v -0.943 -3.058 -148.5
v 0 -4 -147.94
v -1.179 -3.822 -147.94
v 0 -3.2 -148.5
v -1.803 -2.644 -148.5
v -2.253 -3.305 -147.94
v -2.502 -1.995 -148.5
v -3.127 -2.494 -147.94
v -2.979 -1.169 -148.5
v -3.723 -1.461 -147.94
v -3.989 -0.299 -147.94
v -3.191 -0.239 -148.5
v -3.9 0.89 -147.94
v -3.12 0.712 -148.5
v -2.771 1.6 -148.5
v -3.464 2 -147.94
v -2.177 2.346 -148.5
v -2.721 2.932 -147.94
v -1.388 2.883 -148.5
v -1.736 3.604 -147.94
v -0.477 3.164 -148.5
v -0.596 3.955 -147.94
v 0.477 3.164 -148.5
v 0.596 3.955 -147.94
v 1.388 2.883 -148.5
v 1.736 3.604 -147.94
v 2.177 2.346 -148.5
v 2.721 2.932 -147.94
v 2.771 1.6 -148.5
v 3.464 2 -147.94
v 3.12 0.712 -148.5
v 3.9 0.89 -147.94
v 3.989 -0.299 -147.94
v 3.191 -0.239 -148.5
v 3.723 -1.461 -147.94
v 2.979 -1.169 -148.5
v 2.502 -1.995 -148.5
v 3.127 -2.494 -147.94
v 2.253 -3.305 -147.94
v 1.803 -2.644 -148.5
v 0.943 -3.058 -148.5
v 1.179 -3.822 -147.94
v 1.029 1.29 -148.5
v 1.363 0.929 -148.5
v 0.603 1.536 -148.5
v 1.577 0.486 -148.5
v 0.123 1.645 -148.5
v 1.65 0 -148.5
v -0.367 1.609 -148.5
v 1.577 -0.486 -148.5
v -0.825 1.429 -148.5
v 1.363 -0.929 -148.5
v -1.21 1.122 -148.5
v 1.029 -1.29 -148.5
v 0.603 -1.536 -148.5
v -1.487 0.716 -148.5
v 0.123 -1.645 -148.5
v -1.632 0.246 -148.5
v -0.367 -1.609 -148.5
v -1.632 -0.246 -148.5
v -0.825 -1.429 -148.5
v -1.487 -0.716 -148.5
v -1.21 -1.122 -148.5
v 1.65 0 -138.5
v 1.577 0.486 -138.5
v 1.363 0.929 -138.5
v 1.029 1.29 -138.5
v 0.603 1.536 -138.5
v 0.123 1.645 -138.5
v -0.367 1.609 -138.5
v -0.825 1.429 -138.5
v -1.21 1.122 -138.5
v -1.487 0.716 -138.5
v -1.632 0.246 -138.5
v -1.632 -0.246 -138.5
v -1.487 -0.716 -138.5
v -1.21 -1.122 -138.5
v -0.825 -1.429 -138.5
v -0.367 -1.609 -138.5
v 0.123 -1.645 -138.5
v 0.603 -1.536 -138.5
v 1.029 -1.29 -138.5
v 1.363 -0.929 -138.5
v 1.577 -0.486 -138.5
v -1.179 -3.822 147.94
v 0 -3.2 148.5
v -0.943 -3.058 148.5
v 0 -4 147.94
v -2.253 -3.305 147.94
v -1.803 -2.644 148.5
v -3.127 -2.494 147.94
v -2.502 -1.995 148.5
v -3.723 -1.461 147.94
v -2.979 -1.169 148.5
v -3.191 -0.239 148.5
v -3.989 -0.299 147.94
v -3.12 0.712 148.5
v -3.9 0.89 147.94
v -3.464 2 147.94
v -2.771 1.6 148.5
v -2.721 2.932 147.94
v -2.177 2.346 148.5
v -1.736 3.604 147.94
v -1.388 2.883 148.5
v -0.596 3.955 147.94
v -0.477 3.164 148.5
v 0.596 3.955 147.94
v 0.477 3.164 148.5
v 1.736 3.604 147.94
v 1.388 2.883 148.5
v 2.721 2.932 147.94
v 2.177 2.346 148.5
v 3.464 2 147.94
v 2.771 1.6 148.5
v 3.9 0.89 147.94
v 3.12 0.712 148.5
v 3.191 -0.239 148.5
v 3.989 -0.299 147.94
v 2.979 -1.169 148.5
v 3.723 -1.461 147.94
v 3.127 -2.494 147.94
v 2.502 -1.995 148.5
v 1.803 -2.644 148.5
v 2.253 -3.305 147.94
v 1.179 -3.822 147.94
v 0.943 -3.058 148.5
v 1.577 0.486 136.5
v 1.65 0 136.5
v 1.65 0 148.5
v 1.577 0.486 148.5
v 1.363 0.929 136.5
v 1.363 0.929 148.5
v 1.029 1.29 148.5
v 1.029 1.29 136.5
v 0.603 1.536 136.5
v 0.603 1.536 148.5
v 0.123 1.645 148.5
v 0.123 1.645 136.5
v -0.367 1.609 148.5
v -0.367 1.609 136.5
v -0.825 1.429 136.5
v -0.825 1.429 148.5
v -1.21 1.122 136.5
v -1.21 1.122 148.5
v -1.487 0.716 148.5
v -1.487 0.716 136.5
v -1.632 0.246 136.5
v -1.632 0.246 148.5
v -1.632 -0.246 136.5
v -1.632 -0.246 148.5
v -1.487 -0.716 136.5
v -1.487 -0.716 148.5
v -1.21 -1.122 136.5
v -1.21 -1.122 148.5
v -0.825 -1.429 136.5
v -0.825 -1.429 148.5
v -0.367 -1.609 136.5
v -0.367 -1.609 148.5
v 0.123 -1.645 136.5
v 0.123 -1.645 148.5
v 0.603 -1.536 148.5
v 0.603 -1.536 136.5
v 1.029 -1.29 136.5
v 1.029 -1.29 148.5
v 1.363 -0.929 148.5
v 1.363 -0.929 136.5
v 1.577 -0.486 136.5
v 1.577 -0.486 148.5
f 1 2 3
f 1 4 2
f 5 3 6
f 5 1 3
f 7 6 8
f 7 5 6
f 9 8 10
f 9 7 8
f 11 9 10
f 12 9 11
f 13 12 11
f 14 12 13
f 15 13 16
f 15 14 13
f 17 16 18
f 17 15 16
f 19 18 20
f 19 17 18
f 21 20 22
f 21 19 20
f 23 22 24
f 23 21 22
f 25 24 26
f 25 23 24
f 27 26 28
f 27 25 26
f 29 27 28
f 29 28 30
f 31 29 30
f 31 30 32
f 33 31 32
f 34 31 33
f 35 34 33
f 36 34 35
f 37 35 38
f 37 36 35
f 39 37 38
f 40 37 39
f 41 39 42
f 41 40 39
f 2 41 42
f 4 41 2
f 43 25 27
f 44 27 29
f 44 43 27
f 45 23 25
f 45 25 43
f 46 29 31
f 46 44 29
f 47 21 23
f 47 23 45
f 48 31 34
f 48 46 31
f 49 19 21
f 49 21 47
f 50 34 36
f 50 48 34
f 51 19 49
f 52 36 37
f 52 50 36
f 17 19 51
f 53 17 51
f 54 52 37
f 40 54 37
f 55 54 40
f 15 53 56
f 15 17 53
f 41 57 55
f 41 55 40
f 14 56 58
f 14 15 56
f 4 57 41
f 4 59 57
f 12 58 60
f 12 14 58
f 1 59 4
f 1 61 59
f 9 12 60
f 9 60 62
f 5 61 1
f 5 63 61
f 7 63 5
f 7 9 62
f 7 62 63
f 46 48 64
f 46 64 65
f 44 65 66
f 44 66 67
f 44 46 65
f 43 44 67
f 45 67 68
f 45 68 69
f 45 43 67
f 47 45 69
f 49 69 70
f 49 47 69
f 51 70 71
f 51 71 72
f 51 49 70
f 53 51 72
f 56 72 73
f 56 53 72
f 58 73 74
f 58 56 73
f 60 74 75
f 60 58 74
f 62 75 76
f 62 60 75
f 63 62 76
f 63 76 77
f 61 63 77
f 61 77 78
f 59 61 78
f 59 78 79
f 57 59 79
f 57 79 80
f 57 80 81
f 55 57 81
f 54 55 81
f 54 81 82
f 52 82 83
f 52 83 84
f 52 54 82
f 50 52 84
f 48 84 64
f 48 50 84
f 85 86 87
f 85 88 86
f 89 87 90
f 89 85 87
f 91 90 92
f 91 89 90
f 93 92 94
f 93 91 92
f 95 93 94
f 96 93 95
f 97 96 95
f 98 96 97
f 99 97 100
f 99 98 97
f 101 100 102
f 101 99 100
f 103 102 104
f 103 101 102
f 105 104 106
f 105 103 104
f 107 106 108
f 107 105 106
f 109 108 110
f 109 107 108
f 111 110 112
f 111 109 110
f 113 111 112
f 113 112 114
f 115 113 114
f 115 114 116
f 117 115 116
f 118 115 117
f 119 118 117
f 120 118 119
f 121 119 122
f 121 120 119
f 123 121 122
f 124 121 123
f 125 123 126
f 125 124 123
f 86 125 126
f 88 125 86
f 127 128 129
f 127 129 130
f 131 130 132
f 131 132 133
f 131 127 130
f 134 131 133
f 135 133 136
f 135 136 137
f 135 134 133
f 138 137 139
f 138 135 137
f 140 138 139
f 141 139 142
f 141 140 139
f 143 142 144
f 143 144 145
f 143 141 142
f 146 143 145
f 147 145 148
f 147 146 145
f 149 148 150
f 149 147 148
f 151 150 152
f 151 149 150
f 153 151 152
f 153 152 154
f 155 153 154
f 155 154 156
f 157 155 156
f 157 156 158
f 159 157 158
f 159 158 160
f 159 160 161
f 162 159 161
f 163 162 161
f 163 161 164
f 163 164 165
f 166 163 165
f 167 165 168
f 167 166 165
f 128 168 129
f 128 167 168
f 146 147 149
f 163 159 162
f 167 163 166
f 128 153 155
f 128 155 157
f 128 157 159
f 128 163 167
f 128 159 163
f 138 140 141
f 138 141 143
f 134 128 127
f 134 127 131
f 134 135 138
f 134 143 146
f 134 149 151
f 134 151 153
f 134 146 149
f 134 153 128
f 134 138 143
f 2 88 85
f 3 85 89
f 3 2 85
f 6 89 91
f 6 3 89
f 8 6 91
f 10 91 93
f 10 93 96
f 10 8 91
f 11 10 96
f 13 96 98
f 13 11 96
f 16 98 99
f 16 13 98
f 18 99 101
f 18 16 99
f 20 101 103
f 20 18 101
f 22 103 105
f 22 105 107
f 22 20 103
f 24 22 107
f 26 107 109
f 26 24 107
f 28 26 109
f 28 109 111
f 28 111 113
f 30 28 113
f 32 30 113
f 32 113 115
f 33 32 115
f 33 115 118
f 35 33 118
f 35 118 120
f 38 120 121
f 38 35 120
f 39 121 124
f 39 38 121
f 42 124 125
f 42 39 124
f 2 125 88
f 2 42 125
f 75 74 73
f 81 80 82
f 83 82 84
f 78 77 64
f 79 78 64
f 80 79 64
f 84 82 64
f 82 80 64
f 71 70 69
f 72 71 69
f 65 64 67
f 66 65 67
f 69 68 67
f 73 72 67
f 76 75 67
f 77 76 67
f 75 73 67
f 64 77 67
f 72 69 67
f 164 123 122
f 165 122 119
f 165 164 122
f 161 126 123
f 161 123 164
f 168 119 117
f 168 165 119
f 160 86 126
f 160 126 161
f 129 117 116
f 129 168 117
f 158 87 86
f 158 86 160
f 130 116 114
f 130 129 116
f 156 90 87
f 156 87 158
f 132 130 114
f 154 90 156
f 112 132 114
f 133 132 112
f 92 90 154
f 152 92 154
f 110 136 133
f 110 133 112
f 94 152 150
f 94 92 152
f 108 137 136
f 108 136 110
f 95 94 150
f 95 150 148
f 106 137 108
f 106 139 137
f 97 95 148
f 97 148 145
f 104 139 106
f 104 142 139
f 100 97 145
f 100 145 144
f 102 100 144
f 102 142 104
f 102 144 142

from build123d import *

# Parameters (mm, degrees)
SKETCH29_R         = 1.65
CUT_EXTRUDE1_DEPTH = 10
CUT_EXTRUDE2_START = -12
SKETCH30_R         = 1.65
CUT_EXTRUDE2_DEPTH = 12


with BuildPart() as part:
    # Sketch22 → Revolve1 (revolve)
    with BuildSketch(Plane(origin=(0, 0, 0), x_dir=(0, 0, -1), z_dir=(1, 0, 0))):
        Polygon((-148.5, 0), (-148.5, 3.2), (-147.939833969, 4), (147.939833969, 4), (148.5, 3.2), (148.5, 0), align=None)
    revolve(axis=Axis((0, 0, -148.5), (0, 0, -1)))

    # Sketch29 → Cut-Extrude1 (cut)
    with BuildSketch(Plane.XY.offset(-148.5)):
        Circle(SKETCH29_R)
    extrude(amount=CUT_EXTRUDE1_DEPTH, mode=Mode.SUBTRACT)

    # Sketch30 → Cut-Extrude2 (cut)
    with BuildSketch(Plane.XY.offset(148.5).offset(CUT_EXTRUDE2_START)):
        Circle(SKETCH30_R)
    extrude(amount=CUT_EXTRUDE2_DEPTH, mode=Mode.SUBTRACT)


solid = part.part
